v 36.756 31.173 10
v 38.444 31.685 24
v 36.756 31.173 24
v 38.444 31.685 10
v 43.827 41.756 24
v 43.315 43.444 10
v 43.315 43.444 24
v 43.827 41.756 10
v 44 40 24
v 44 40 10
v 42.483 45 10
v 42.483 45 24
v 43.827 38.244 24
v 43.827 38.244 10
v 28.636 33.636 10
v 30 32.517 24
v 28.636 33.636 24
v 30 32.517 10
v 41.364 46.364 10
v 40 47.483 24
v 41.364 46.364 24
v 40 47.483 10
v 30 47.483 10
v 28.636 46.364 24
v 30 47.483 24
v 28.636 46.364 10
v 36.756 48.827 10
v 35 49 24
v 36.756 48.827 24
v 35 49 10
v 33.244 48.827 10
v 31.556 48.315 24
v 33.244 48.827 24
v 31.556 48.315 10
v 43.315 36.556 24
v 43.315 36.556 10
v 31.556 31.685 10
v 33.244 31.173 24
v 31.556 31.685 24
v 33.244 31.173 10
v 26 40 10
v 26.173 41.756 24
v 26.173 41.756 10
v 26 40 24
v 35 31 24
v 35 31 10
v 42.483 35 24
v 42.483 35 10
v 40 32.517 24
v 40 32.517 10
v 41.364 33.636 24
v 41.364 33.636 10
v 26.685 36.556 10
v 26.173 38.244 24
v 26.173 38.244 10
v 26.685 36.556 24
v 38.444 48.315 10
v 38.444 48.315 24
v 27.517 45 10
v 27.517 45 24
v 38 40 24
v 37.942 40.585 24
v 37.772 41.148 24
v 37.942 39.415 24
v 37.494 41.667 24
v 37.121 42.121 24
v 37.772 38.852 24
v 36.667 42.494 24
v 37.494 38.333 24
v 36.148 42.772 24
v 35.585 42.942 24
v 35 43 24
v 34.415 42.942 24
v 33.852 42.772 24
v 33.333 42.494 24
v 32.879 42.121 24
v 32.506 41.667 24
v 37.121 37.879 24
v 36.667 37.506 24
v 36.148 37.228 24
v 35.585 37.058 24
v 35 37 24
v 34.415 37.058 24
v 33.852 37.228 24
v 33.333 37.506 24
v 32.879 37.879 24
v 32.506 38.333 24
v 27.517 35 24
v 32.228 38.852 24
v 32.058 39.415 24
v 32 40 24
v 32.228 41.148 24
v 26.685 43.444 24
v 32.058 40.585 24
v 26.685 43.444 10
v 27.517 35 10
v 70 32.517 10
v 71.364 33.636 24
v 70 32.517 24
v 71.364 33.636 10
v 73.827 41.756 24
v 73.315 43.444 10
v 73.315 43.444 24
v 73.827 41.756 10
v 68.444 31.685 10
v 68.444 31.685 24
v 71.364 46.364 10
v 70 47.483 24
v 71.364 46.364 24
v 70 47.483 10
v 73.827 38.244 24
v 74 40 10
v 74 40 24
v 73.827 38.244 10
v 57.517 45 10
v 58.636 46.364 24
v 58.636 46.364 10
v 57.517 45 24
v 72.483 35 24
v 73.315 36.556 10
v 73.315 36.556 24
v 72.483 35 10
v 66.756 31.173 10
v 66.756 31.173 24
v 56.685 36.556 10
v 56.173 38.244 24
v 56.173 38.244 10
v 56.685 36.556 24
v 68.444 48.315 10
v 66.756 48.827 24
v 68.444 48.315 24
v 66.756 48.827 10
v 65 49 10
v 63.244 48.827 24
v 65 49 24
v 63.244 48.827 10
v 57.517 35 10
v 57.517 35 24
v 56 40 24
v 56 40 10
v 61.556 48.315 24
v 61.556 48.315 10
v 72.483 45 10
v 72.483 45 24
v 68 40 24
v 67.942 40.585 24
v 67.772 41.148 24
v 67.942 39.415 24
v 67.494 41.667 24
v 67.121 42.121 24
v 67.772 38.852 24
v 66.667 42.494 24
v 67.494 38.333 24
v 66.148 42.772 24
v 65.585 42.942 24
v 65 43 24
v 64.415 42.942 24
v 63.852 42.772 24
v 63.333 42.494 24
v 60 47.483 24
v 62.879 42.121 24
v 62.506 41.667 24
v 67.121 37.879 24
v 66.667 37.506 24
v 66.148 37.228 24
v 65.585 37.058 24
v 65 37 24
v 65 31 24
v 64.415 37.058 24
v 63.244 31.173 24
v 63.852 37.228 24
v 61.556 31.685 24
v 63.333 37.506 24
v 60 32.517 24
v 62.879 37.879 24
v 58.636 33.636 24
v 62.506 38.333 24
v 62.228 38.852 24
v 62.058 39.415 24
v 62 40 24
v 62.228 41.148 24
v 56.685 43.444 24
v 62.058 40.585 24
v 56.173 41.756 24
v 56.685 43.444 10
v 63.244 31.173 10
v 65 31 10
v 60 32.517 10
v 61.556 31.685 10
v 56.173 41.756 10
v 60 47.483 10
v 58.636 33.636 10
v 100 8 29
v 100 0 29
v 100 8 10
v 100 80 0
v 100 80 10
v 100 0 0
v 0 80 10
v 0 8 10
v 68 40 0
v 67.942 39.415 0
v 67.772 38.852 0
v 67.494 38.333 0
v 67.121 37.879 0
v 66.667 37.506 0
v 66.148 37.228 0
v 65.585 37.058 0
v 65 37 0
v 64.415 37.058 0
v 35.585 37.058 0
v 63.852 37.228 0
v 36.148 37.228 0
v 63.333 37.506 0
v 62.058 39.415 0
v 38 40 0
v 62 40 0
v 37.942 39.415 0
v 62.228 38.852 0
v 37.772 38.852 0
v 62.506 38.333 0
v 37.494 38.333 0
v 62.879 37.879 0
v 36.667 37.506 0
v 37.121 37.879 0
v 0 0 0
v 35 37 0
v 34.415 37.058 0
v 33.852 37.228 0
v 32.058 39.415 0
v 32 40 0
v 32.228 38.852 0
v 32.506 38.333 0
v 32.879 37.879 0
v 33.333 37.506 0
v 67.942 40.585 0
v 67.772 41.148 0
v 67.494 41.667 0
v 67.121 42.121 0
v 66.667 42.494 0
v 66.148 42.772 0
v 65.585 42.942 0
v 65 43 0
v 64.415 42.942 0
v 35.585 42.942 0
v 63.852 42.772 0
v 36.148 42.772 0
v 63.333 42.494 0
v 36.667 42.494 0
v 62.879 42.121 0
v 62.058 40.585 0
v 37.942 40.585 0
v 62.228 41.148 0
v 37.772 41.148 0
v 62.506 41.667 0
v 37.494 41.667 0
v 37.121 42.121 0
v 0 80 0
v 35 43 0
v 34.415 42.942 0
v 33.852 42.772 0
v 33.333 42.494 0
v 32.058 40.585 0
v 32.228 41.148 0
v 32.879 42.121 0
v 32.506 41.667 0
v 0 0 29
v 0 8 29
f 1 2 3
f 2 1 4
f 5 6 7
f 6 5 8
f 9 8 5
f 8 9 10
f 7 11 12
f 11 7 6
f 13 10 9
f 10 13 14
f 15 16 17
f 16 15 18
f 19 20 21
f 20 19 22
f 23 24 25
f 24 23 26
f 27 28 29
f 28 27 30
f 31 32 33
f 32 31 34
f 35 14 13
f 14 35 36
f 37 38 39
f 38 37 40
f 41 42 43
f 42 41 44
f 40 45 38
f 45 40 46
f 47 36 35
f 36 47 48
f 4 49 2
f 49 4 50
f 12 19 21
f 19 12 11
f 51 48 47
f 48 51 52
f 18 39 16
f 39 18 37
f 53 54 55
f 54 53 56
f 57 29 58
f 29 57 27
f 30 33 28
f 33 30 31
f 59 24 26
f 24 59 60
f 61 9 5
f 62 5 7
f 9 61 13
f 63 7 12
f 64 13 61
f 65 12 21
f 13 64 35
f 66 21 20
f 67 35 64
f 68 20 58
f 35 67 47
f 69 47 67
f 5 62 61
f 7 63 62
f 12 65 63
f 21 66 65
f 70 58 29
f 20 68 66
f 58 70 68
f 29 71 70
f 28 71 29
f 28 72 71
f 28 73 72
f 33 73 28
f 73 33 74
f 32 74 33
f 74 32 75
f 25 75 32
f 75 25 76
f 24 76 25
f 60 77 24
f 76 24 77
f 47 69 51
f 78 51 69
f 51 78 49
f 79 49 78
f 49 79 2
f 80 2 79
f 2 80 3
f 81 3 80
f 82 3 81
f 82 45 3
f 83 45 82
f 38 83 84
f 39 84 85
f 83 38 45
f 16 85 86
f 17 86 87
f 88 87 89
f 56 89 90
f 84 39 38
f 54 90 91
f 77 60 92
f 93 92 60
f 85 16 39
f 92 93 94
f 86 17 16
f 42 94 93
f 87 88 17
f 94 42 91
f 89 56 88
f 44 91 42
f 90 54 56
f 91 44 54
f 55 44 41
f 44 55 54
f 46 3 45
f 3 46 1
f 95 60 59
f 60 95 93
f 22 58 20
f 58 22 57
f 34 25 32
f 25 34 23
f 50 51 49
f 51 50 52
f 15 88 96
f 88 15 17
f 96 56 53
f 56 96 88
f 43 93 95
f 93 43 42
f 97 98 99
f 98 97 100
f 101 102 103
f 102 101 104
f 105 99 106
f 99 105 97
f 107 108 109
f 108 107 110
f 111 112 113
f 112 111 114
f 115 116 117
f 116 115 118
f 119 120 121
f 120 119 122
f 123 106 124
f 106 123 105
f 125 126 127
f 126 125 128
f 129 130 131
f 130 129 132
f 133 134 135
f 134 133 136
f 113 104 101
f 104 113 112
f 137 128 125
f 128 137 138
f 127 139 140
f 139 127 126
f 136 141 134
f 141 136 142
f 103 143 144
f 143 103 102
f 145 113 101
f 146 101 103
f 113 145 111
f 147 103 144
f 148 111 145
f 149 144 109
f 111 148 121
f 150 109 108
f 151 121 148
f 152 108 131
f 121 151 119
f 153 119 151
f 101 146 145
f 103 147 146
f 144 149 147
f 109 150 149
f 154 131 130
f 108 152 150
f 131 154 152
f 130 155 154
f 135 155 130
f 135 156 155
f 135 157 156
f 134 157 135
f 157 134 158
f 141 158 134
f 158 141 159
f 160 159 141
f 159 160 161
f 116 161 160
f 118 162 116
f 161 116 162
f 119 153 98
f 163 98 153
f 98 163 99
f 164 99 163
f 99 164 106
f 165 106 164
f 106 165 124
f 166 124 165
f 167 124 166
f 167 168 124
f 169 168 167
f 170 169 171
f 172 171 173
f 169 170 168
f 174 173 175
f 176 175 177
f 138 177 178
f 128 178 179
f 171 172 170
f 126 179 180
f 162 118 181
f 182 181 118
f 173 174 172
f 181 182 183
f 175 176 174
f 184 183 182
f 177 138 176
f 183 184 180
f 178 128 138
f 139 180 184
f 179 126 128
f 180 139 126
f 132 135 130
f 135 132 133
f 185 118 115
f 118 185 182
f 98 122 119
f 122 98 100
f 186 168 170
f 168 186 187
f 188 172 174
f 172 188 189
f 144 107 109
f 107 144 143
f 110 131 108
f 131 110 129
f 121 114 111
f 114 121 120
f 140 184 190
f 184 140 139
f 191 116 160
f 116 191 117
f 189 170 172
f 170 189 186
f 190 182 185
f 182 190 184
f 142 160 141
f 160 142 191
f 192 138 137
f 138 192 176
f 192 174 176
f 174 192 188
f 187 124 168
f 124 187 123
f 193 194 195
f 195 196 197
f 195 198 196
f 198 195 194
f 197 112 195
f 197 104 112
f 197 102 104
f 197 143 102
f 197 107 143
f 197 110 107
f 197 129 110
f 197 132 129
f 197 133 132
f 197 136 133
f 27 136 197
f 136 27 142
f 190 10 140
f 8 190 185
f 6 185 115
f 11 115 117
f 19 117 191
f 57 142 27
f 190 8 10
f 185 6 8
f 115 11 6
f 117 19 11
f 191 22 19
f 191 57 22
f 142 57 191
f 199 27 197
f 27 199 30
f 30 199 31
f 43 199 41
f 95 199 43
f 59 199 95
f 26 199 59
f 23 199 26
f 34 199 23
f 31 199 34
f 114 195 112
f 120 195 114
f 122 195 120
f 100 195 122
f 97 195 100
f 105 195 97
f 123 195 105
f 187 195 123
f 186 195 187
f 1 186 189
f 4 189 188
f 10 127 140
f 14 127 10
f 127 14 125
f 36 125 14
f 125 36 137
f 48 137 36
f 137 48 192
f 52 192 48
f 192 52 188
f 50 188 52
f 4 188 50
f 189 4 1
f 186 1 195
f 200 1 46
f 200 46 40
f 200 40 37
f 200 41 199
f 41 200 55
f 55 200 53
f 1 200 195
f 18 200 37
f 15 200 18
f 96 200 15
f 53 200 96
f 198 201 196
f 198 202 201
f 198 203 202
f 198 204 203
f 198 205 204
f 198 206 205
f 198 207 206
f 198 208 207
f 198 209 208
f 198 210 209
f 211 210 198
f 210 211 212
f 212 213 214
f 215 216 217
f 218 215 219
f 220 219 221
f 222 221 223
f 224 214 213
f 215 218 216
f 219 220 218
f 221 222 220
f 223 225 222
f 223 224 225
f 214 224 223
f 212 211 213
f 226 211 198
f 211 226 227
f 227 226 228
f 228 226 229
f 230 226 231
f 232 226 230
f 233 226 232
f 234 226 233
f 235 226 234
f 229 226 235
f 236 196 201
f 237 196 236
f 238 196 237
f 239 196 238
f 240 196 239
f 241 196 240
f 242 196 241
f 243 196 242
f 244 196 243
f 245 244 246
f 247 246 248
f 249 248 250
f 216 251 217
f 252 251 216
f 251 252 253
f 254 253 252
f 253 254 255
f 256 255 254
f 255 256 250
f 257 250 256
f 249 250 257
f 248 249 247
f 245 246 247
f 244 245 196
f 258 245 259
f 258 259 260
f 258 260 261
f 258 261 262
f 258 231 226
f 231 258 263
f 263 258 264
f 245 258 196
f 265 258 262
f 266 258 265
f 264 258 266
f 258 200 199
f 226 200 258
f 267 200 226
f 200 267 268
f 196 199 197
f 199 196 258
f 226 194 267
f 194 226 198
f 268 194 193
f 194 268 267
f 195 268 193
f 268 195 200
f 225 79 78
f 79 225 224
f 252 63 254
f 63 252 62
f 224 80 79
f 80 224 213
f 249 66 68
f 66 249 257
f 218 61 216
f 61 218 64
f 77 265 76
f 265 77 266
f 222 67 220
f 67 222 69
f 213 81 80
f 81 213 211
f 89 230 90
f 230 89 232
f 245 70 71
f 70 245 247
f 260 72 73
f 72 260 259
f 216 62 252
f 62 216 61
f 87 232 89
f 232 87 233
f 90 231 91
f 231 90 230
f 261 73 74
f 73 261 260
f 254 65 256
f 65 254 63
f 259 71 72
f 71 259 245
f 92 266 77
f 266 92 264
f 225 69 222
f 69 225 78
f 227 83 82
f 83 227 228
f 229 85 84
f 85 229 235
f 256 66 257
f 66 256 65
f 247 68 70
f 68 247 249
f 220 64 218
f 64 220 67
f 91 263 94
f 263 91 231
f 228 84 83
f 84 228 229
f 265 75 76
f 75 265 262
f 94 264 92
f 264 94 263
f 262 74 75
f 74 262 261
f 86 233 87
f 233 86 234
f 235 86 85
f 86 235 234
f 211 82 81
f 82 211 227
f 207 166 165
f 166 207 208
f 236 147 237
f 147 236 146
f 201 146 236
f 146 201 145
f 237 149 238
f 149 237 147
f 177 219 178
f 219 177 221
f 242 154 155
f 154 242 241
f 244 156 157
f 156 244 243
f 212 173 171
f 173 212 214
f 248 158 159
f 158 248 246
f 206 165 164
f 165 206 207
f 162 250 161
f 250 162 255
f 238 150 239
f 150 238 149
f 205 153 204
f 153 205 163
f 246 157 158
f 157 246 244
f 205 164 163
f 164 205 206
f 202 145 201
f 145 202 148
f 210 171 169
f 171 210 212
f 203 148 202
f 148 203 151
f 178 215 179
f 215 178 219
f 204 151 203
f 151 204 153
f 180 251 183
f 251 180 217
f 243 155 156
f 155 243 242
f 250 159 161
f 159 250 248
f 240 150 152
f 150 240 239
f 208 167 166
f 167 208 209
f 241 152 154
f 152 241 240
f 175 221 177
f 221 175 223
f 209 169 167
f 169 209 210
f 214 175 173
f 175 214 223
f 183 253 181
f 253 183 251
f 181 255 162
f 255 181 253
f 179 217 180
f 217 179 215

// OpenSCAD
$fn = 32;

// ----------------------------------------------------------------------
// Drill jig: fence jig
// ----------------------------------------------------------------------

// --- parameters (mm) ---
plate_l = 100;            // plate length, X
plate_w = 80;             // plate width, Y
plate_t = 10;             // plate thickness
boss_d = 18;              // guide boss diameter
boss_h = 15;              // boss height above the plate
guide_d = 6;              // guide hole diameter
boss_pitch = 30;          // boss pitch
fence_h = 20;             // fence height above the plate
fence_t = 8;              // fence thickness

n_boss = 2;  // guide bosses
boss_x0 = (plate_l - (n_boss - 1) * boss_pitch) / 2;  // first boss X
boss_top = plate_t - 1 + boss_h;  // boss crown height
fence_top = plate_t - 1 + fence_h;  // fence crown height
total_h = max([fence_top, boss_top]);  // overall height

difference() {
  union() {
  cube([plate_l, plate_w, plate_t]);
  for (i = [0 : n_boss - 1])
    translate([boss_x0 + i * boss_pitch, plate_w / 2, plate_t - 1])
      cylinder(h = boss_h, d = boss_d);
  translate([0, 0, plate_t - 1]) cube([plate_l, fence_t, fence_h]);
  }
  for (i = [0 : n_boss - 1])
    translate([boss_x0 + i * boss_pitch, plate_w / 2, -1])
      cylinder(h = plate_t + boss_h, d = guide_d);
}
